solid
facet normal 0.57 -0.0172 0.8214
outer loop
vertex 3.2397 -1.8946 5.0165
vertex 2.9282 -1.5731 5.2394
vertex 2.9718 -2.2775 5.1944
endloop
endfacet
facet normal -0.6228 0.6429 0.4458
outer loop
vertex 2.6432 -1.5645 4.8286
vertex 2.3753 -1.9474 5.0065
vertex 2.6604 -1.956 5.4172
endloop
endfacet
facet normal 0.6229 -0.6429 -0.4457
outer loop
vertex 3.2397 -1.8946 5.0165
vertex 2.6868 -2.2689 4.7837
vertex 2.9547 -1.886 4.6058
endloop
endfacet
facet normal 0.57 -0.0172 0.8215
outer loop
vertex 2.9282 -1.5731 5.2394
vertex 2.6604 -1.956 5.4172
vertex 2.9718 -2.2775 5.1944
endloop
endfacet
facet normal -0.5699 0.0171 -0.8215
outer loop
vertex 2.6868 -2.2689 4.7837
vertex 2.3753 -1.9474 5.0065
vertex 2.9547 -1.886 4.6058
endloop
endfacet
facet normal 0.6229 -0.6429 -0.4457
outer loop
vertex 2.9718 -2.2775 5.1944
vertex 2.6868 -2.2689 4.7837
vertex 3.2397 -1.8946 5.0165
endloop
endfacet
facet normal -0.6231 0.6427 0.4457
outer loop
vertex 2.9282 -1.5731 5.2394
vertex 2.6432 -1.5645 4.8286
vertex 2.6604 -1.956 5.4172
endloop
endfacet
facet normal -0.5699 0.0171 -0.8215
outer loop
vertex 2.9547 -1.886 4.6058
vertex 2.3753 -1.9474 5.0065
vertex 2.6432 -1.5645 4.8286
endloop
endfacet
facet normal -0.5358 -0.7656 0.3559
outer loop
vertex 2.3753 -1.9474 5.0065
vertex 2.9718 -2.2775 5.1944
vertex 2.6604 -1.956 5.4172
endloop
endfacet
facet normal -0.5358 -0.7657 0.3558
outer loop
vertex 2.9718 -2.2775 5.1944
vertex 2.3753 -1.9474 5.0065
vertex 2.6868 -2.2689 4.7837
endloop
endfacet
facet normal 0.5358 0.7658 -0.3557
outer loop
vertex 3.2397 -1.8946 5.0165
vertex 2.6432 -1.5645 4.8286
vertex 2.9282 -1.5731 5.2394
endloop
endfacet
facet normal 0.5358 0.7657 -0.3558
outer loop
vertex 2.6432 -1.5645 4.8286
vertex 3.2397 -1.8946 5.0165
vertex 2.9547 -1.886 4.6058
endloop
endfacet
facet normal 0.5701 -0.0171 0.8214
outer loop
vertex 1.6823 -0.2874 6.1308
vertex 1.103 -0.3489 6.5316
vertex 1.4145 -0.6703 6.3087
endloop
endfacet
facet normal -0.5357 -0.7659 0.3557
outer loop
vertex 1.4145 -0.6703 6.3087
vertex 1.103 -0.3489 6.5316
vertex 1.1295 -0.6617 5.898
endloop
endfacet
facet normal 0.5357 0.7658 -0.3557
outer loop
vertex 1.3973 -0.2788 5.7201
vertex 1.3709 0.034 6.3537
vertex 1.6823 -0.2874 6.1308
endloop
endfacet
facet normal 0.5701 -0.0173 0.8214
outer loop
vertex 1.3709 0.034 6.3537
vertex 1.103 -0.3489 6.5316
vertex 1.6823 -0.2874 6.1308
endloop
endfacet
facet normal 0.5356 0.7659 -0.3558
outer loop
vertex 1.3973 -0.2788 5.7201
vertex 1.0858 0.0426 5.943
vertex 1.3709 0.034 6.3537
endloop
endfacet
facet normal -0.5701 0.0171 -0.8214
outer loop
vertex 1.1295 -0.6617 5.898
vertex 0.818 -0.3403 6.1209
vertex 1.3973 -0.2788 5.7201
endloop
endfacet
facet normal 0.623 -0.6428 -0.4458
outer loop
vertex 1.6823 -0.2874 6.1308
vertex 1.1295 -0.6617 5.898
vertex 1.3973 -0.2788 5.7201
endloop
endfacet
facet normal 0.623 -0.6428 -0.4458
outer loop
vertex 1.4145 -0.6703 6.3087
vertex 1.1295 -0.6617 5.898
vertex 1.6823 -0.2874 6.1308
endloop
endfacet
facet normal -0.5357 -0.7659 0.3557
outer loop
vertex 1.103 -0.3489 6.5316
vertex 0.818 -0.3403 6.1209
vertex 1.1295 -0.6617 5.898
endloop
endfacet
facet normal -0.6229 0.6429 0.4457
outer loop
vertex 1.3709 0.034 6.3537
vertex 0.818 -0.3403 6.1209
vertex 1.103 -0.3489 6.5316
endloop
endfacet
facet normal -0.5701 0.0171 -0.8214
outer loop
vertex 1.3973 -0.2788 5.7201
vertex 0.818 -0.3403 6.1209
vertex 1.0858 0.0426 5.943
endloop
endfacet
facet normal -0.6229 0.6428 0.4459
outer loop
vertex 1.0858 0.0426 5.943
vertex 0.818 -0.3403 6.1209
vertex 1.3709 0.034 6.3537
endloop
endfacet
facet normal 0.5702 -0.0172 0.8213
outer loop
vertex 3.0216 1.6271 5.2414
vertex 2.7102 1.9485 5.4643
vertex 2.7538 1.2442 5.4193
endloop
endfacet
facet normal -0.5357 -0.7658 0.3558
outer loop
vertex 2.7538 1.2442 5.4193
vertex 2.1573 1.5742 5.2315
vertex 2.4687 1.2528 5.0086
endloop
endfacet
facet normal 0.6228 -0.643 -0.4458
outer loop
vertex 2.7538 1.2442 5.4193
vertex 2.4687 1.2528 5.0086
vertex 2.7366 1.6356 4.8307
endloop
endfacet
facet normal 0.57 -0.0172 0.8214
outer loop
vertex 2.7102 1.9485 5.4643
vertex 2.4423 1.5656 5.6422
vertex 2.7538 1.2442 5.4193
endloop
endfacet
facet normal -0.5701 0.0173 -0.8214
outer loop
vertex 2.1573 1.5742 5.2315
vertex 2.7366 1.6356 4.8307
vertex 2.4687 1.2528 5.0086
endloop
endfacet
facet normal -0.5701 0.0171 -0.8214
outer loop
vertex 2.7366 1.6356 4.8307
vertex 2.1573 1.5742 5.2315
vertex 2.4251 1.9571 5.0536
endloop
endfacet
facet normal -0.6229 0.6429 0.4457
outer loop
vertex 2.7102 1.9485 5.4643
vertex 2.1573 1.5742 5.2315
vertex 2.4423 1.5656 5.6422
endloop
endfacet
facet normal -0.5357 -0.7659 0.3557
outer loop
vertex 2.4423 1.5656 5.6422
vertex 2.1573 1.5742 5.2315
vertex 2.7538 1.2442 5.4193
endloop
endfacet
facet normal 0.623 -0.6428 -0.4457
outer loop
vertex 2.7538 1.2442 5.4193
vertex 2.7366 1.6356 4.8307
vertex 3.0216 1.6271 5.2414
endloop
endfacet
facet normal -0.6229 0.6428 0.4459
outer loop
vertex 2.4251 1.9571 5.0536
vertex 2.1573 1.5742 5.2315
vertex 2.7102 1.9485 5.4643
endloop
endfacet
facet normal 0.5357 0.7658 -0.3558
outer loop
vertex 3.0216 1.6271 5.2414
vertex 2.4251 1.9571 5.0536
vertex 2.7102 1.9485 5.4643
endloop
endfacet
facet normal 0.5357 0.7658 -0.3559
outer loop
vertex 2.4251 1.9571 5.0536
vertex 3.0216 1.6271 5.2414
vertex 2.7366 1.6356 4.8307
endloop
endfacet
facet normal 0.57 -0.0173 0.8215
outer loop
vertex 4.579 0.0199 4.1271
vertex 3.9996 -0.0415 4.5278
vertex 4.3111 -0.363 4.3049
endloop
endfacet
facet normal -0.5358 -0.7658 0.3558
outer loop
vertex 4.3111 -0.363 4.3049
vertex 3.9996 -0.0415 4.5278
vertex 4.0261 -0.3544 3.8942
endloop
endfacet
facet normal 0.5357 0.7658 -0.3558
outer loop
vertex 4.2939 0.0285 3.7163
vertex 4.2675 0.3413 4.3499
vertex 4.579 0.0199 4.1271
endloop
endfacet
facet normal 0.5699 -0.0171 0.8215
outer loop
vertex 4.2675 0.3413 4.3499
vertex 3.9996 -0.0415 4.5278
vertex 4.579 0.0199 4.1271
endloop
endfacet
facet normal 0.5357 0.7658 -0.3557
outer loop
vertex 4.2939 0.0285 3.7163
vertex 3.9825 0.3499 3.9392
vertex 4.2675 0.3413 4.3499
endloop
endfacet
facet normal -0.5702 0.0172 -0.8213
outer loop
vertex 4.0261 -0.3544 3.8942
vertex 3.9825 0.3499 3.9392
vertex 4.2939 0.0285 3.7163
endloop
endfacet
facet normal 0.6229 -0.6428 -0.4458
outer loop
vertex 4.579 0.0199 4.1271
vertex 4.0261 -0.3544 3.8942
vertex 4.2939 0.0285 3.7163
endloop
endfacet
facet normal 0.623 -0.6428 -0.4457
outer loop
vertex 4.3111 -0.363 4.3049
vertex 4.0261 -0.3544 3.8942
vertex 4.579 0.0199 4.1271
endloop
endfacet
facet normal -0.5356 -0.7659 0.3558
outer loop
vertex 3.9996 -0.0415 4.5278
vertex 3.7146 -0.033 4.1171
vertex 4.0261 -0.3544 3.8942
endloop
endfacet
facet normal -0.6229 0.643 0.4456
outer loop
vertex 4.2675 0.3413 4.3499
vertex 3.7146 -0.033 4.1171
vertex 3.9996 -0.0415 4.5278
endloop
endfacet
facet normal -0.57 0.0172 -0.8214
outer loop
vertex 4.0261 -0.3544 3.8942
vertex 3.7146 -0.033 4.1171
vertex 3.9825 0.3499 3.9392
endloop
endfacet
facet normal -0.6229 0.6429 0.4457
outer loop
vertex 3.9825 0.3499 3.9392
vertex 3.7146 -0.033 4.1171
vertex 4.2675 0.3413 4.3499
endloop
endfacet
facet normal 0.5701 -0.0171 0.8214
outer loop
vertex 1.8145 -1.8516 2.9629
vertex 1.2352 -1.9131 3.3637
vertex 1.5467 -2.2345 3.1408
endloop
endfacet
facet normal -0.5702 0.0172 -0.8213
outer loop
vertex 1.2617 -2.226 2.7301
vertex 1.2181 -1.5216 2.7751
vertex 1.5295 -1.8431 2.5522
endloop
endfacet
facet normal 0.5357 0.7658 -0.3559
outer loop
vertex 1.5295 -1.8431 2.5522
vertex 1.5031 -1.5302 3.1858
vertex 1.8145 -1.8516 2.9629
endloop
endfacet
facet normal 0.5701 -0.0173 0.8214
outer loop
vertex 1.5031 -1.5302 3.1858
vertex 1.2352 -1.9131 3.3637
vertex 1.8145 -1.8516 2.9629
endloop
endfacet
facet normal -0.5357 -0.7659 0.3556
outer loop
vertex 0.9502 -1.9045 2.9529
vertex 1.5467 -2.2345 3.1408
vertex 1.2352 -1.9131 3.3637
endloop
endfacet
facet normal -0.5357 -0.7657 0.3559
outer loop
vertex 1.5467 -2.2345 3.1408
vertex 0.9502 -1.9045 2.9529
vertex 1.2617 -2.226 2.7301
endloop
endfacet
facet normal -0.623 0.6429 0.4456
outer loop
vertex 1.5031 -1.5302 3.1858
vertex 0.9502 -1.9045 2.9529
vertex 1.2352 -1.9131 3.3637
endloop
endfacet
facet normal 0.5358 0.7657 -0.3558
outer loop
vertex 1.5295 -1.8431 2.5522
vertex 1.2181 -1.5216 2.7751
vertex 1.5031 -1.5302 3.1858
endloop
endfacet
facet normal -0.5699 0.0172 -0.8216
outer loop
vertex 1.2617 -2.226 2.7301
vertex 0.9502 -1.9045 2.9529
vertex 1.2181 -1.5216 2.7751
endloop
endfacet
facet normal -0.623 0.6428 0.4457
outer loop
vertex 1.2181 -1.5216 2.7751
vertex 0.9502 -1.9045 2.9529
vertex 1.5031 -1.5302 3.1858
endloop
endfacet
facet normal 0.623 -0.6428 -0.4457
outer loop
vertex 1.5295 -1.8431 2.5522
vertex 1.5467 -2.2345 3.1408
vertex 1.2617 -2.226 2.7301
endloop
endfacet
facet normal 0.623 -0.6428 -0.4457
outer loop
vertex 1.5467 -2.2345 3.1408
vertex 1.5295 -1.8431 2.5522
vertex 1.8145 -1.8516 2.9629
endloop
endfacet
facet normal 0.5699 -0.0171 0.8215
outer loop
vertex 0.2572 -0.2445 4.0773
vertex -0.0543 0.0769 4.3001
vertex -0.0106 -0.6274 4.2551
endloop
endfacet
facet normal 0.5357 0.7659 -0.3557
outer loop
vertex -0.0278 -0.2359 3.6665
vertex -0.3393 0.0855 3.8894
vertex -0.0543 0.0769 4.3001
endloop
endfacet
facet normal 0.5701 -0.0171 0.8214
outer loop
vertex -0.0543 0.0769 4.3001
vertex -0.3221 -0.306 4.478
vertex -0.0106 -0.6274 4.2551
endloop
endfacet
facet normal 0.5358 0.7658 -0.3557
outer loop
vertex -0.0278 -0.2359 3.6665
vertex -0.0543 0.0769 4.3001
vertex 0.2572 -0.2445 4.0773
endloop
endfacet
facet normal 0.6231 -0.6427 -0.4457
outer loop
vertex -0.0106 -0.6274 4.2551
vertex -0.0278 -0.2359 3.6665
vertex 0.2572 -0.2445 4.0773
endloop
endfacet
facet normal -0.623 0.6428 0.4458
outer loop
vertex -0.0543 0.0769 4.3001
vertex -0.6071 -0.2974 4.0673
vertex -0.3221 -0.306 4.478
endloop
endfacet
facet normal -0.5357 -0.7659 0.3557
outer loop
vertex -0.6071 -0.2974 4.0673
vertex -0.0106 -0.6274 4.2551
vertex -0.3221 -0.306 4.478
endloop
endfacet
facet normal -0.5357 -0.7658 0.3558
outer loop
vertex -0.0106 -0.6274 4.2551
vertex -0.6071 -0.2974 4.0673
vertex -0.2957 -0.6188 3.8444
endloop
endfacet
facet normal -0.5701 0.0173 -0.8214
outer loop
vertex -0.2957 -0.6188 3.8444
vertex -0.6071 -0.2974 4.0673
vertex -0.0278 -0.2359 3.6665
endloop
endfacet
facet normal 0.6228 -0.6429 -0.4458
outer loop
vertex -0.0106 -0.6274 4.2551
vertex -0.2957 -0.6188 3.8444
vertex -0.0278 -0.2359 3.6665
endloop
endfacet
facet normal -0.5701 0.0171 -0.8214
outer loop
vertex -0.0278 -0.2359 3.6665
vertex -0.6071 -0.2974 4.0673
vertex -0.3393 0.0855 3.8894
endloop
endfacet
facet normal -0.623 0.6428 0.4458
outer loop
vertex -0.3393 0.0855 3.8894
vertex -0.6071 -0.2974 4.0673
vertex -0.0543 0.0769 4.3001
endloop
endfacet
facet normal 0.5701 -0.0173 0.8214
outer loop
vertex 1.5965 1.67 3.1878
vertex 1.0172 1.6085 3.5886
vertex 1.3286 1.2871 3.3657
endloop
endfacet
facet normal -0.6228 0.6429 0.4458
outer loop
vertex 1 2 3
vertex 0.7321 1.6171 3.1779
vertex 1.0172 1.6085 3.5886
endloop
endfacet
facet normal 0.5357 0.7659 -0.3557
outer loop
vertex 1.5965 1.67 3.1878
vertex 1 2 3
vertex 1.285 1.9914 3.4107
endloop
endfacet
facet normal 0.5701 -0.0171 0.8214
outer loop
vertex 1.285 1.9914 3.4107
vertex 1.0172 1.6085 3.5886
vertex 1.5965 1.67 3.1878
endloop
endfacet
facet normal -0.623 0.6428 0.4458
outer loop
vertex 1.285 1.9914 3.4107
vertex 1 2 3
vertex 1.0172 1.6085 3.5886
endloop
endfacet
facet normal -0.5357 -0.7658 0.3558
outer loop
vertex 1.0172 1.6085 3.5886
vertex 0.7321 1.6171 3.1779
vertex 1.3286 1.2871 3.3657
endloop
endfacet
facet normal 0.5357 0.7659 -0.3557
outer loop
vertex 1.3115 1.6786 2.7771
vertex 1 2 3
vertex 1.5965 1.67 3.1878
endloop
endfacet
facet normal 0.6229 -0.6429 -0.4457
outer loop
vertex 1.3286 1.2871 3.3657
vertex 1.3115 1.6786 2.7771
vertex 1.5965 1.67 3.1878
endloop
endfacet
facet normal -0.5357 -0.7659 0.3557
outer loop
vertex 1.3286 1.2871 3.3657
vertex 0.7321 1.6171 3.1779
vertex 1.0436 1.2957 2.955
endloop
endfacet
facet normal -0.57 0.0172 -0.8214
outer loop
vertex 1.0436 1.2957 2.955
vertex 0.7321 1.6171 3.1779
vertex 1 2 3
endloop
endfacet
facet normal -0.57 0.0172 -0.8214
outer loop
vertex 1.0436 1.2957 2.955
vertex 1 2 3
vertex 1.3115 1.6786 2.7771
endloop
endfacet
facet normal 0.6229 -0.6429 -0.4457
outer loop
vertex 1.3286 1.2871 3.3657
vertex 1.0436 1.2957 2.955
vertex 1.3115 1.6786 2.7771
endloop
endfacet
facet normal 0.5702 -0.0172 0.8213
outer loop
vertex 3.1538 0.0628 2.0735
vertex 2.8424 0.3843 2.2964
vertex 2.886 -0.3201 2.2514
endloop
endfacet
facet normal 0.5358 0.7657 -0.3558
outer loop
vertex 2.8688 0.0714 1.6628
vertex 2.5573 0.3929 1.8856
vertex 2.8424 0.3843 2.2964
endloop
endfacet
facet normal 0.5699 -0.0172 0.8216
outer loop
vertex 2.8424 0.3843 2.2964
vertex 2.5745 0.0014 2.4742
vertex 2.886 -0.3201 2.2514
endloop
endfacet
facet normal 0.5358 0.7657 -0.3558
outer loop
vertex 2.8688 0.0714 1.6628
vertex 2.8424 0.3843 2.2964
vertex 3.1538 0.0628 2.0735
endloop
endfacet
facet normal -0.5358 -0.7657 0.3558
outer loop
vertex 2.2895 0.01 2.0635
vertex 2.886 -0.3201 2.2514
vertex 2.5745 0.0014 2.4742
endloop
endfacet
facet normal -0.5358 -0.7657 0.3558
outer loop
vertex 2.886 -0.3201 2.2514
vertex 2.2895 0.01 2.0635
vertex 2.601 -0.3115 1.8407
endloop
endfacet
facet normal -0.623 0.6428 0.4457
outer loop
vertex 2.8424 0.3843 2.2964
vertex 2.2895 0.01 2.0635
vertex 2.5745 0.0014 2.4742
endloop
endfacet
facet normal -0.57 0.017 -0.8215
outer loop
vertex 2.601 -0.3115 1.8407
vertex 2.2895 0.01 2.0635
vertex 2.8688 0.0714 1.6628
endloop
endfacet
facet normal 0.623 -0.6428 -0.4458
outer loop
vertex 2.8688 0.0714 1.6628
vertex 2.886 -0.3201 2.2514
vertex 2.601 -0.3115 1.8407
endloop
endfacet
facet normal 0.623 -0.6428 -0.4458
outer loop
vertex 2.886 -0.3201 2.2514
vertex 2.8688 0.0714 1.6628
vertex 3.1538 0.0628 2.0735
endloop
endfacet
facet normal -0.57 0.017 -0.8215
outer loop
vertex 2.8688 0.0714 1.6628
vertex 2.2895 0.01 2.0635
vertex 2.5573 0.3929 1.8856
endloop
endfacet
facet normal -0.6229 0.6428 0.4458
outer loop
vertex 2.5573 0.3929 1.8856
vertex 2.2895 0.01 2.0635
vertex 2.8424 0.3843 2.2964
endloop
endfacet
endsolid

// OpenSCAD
$fn=7;
union()
{
	union()
	{
		translate([2.686799,-2.2688754,4.7836504])
		{
			rotate(60,[0.26726124,0.5345225,0.80178374])
			{
				cube([0.5,0.5,0.5]);
			}
		}
		translate([1.1294578,-0.6617327,5.898002])
		{
			rotate(60,[0.26726124,0.5345225,0.80178374])
			{
				cube([0.5,0.5,0.5]);
			}
		}
		translate([2.4687433,1.2527516,5.008584])
		{
			rotate(60,[0.26726124,0.5345225,0.80178374])
			{
				cube([0.5,0.5,0.5]);
			}
		}
		translate([4.026085,-0.3543911,3.8942323])
		{
			rotate(60,[0.26726124,0.5345225,0.80178374])
			{
				cube([0.5,0.5,0.5]);
			}
		}
	}
	union()
	{
		translate([1.2616667,-2.2259521,2.7300792])
		{
			rotate(60,[0.26726124,0.5345225,0.80178374])
			{
				cube([0.5,0.5,0.5]);
			}
		}
		translate([-0.29567456,-0.61880946,3.844431])
		{
			rotate(60,[0.26726124,0.5345225,0.80178374])
			{
				cube([0.5,0.5,0.5]);
			}
		}
		translate([1.043611,1.2956748,2.955013])
		{
			rotate(60,[0.26726124,0.5345225,0.80178374])
			{
				cube([0.5,0.5,0.5]);
			}
		}
		translate([2.6009521,-0.3114679,1.8406612])
		{
			rotate(60,[0.26726124,0.5345225,0.80178374])
			{
				cube([0.5,0.5,0.5]);
			}
		}
	}
}
